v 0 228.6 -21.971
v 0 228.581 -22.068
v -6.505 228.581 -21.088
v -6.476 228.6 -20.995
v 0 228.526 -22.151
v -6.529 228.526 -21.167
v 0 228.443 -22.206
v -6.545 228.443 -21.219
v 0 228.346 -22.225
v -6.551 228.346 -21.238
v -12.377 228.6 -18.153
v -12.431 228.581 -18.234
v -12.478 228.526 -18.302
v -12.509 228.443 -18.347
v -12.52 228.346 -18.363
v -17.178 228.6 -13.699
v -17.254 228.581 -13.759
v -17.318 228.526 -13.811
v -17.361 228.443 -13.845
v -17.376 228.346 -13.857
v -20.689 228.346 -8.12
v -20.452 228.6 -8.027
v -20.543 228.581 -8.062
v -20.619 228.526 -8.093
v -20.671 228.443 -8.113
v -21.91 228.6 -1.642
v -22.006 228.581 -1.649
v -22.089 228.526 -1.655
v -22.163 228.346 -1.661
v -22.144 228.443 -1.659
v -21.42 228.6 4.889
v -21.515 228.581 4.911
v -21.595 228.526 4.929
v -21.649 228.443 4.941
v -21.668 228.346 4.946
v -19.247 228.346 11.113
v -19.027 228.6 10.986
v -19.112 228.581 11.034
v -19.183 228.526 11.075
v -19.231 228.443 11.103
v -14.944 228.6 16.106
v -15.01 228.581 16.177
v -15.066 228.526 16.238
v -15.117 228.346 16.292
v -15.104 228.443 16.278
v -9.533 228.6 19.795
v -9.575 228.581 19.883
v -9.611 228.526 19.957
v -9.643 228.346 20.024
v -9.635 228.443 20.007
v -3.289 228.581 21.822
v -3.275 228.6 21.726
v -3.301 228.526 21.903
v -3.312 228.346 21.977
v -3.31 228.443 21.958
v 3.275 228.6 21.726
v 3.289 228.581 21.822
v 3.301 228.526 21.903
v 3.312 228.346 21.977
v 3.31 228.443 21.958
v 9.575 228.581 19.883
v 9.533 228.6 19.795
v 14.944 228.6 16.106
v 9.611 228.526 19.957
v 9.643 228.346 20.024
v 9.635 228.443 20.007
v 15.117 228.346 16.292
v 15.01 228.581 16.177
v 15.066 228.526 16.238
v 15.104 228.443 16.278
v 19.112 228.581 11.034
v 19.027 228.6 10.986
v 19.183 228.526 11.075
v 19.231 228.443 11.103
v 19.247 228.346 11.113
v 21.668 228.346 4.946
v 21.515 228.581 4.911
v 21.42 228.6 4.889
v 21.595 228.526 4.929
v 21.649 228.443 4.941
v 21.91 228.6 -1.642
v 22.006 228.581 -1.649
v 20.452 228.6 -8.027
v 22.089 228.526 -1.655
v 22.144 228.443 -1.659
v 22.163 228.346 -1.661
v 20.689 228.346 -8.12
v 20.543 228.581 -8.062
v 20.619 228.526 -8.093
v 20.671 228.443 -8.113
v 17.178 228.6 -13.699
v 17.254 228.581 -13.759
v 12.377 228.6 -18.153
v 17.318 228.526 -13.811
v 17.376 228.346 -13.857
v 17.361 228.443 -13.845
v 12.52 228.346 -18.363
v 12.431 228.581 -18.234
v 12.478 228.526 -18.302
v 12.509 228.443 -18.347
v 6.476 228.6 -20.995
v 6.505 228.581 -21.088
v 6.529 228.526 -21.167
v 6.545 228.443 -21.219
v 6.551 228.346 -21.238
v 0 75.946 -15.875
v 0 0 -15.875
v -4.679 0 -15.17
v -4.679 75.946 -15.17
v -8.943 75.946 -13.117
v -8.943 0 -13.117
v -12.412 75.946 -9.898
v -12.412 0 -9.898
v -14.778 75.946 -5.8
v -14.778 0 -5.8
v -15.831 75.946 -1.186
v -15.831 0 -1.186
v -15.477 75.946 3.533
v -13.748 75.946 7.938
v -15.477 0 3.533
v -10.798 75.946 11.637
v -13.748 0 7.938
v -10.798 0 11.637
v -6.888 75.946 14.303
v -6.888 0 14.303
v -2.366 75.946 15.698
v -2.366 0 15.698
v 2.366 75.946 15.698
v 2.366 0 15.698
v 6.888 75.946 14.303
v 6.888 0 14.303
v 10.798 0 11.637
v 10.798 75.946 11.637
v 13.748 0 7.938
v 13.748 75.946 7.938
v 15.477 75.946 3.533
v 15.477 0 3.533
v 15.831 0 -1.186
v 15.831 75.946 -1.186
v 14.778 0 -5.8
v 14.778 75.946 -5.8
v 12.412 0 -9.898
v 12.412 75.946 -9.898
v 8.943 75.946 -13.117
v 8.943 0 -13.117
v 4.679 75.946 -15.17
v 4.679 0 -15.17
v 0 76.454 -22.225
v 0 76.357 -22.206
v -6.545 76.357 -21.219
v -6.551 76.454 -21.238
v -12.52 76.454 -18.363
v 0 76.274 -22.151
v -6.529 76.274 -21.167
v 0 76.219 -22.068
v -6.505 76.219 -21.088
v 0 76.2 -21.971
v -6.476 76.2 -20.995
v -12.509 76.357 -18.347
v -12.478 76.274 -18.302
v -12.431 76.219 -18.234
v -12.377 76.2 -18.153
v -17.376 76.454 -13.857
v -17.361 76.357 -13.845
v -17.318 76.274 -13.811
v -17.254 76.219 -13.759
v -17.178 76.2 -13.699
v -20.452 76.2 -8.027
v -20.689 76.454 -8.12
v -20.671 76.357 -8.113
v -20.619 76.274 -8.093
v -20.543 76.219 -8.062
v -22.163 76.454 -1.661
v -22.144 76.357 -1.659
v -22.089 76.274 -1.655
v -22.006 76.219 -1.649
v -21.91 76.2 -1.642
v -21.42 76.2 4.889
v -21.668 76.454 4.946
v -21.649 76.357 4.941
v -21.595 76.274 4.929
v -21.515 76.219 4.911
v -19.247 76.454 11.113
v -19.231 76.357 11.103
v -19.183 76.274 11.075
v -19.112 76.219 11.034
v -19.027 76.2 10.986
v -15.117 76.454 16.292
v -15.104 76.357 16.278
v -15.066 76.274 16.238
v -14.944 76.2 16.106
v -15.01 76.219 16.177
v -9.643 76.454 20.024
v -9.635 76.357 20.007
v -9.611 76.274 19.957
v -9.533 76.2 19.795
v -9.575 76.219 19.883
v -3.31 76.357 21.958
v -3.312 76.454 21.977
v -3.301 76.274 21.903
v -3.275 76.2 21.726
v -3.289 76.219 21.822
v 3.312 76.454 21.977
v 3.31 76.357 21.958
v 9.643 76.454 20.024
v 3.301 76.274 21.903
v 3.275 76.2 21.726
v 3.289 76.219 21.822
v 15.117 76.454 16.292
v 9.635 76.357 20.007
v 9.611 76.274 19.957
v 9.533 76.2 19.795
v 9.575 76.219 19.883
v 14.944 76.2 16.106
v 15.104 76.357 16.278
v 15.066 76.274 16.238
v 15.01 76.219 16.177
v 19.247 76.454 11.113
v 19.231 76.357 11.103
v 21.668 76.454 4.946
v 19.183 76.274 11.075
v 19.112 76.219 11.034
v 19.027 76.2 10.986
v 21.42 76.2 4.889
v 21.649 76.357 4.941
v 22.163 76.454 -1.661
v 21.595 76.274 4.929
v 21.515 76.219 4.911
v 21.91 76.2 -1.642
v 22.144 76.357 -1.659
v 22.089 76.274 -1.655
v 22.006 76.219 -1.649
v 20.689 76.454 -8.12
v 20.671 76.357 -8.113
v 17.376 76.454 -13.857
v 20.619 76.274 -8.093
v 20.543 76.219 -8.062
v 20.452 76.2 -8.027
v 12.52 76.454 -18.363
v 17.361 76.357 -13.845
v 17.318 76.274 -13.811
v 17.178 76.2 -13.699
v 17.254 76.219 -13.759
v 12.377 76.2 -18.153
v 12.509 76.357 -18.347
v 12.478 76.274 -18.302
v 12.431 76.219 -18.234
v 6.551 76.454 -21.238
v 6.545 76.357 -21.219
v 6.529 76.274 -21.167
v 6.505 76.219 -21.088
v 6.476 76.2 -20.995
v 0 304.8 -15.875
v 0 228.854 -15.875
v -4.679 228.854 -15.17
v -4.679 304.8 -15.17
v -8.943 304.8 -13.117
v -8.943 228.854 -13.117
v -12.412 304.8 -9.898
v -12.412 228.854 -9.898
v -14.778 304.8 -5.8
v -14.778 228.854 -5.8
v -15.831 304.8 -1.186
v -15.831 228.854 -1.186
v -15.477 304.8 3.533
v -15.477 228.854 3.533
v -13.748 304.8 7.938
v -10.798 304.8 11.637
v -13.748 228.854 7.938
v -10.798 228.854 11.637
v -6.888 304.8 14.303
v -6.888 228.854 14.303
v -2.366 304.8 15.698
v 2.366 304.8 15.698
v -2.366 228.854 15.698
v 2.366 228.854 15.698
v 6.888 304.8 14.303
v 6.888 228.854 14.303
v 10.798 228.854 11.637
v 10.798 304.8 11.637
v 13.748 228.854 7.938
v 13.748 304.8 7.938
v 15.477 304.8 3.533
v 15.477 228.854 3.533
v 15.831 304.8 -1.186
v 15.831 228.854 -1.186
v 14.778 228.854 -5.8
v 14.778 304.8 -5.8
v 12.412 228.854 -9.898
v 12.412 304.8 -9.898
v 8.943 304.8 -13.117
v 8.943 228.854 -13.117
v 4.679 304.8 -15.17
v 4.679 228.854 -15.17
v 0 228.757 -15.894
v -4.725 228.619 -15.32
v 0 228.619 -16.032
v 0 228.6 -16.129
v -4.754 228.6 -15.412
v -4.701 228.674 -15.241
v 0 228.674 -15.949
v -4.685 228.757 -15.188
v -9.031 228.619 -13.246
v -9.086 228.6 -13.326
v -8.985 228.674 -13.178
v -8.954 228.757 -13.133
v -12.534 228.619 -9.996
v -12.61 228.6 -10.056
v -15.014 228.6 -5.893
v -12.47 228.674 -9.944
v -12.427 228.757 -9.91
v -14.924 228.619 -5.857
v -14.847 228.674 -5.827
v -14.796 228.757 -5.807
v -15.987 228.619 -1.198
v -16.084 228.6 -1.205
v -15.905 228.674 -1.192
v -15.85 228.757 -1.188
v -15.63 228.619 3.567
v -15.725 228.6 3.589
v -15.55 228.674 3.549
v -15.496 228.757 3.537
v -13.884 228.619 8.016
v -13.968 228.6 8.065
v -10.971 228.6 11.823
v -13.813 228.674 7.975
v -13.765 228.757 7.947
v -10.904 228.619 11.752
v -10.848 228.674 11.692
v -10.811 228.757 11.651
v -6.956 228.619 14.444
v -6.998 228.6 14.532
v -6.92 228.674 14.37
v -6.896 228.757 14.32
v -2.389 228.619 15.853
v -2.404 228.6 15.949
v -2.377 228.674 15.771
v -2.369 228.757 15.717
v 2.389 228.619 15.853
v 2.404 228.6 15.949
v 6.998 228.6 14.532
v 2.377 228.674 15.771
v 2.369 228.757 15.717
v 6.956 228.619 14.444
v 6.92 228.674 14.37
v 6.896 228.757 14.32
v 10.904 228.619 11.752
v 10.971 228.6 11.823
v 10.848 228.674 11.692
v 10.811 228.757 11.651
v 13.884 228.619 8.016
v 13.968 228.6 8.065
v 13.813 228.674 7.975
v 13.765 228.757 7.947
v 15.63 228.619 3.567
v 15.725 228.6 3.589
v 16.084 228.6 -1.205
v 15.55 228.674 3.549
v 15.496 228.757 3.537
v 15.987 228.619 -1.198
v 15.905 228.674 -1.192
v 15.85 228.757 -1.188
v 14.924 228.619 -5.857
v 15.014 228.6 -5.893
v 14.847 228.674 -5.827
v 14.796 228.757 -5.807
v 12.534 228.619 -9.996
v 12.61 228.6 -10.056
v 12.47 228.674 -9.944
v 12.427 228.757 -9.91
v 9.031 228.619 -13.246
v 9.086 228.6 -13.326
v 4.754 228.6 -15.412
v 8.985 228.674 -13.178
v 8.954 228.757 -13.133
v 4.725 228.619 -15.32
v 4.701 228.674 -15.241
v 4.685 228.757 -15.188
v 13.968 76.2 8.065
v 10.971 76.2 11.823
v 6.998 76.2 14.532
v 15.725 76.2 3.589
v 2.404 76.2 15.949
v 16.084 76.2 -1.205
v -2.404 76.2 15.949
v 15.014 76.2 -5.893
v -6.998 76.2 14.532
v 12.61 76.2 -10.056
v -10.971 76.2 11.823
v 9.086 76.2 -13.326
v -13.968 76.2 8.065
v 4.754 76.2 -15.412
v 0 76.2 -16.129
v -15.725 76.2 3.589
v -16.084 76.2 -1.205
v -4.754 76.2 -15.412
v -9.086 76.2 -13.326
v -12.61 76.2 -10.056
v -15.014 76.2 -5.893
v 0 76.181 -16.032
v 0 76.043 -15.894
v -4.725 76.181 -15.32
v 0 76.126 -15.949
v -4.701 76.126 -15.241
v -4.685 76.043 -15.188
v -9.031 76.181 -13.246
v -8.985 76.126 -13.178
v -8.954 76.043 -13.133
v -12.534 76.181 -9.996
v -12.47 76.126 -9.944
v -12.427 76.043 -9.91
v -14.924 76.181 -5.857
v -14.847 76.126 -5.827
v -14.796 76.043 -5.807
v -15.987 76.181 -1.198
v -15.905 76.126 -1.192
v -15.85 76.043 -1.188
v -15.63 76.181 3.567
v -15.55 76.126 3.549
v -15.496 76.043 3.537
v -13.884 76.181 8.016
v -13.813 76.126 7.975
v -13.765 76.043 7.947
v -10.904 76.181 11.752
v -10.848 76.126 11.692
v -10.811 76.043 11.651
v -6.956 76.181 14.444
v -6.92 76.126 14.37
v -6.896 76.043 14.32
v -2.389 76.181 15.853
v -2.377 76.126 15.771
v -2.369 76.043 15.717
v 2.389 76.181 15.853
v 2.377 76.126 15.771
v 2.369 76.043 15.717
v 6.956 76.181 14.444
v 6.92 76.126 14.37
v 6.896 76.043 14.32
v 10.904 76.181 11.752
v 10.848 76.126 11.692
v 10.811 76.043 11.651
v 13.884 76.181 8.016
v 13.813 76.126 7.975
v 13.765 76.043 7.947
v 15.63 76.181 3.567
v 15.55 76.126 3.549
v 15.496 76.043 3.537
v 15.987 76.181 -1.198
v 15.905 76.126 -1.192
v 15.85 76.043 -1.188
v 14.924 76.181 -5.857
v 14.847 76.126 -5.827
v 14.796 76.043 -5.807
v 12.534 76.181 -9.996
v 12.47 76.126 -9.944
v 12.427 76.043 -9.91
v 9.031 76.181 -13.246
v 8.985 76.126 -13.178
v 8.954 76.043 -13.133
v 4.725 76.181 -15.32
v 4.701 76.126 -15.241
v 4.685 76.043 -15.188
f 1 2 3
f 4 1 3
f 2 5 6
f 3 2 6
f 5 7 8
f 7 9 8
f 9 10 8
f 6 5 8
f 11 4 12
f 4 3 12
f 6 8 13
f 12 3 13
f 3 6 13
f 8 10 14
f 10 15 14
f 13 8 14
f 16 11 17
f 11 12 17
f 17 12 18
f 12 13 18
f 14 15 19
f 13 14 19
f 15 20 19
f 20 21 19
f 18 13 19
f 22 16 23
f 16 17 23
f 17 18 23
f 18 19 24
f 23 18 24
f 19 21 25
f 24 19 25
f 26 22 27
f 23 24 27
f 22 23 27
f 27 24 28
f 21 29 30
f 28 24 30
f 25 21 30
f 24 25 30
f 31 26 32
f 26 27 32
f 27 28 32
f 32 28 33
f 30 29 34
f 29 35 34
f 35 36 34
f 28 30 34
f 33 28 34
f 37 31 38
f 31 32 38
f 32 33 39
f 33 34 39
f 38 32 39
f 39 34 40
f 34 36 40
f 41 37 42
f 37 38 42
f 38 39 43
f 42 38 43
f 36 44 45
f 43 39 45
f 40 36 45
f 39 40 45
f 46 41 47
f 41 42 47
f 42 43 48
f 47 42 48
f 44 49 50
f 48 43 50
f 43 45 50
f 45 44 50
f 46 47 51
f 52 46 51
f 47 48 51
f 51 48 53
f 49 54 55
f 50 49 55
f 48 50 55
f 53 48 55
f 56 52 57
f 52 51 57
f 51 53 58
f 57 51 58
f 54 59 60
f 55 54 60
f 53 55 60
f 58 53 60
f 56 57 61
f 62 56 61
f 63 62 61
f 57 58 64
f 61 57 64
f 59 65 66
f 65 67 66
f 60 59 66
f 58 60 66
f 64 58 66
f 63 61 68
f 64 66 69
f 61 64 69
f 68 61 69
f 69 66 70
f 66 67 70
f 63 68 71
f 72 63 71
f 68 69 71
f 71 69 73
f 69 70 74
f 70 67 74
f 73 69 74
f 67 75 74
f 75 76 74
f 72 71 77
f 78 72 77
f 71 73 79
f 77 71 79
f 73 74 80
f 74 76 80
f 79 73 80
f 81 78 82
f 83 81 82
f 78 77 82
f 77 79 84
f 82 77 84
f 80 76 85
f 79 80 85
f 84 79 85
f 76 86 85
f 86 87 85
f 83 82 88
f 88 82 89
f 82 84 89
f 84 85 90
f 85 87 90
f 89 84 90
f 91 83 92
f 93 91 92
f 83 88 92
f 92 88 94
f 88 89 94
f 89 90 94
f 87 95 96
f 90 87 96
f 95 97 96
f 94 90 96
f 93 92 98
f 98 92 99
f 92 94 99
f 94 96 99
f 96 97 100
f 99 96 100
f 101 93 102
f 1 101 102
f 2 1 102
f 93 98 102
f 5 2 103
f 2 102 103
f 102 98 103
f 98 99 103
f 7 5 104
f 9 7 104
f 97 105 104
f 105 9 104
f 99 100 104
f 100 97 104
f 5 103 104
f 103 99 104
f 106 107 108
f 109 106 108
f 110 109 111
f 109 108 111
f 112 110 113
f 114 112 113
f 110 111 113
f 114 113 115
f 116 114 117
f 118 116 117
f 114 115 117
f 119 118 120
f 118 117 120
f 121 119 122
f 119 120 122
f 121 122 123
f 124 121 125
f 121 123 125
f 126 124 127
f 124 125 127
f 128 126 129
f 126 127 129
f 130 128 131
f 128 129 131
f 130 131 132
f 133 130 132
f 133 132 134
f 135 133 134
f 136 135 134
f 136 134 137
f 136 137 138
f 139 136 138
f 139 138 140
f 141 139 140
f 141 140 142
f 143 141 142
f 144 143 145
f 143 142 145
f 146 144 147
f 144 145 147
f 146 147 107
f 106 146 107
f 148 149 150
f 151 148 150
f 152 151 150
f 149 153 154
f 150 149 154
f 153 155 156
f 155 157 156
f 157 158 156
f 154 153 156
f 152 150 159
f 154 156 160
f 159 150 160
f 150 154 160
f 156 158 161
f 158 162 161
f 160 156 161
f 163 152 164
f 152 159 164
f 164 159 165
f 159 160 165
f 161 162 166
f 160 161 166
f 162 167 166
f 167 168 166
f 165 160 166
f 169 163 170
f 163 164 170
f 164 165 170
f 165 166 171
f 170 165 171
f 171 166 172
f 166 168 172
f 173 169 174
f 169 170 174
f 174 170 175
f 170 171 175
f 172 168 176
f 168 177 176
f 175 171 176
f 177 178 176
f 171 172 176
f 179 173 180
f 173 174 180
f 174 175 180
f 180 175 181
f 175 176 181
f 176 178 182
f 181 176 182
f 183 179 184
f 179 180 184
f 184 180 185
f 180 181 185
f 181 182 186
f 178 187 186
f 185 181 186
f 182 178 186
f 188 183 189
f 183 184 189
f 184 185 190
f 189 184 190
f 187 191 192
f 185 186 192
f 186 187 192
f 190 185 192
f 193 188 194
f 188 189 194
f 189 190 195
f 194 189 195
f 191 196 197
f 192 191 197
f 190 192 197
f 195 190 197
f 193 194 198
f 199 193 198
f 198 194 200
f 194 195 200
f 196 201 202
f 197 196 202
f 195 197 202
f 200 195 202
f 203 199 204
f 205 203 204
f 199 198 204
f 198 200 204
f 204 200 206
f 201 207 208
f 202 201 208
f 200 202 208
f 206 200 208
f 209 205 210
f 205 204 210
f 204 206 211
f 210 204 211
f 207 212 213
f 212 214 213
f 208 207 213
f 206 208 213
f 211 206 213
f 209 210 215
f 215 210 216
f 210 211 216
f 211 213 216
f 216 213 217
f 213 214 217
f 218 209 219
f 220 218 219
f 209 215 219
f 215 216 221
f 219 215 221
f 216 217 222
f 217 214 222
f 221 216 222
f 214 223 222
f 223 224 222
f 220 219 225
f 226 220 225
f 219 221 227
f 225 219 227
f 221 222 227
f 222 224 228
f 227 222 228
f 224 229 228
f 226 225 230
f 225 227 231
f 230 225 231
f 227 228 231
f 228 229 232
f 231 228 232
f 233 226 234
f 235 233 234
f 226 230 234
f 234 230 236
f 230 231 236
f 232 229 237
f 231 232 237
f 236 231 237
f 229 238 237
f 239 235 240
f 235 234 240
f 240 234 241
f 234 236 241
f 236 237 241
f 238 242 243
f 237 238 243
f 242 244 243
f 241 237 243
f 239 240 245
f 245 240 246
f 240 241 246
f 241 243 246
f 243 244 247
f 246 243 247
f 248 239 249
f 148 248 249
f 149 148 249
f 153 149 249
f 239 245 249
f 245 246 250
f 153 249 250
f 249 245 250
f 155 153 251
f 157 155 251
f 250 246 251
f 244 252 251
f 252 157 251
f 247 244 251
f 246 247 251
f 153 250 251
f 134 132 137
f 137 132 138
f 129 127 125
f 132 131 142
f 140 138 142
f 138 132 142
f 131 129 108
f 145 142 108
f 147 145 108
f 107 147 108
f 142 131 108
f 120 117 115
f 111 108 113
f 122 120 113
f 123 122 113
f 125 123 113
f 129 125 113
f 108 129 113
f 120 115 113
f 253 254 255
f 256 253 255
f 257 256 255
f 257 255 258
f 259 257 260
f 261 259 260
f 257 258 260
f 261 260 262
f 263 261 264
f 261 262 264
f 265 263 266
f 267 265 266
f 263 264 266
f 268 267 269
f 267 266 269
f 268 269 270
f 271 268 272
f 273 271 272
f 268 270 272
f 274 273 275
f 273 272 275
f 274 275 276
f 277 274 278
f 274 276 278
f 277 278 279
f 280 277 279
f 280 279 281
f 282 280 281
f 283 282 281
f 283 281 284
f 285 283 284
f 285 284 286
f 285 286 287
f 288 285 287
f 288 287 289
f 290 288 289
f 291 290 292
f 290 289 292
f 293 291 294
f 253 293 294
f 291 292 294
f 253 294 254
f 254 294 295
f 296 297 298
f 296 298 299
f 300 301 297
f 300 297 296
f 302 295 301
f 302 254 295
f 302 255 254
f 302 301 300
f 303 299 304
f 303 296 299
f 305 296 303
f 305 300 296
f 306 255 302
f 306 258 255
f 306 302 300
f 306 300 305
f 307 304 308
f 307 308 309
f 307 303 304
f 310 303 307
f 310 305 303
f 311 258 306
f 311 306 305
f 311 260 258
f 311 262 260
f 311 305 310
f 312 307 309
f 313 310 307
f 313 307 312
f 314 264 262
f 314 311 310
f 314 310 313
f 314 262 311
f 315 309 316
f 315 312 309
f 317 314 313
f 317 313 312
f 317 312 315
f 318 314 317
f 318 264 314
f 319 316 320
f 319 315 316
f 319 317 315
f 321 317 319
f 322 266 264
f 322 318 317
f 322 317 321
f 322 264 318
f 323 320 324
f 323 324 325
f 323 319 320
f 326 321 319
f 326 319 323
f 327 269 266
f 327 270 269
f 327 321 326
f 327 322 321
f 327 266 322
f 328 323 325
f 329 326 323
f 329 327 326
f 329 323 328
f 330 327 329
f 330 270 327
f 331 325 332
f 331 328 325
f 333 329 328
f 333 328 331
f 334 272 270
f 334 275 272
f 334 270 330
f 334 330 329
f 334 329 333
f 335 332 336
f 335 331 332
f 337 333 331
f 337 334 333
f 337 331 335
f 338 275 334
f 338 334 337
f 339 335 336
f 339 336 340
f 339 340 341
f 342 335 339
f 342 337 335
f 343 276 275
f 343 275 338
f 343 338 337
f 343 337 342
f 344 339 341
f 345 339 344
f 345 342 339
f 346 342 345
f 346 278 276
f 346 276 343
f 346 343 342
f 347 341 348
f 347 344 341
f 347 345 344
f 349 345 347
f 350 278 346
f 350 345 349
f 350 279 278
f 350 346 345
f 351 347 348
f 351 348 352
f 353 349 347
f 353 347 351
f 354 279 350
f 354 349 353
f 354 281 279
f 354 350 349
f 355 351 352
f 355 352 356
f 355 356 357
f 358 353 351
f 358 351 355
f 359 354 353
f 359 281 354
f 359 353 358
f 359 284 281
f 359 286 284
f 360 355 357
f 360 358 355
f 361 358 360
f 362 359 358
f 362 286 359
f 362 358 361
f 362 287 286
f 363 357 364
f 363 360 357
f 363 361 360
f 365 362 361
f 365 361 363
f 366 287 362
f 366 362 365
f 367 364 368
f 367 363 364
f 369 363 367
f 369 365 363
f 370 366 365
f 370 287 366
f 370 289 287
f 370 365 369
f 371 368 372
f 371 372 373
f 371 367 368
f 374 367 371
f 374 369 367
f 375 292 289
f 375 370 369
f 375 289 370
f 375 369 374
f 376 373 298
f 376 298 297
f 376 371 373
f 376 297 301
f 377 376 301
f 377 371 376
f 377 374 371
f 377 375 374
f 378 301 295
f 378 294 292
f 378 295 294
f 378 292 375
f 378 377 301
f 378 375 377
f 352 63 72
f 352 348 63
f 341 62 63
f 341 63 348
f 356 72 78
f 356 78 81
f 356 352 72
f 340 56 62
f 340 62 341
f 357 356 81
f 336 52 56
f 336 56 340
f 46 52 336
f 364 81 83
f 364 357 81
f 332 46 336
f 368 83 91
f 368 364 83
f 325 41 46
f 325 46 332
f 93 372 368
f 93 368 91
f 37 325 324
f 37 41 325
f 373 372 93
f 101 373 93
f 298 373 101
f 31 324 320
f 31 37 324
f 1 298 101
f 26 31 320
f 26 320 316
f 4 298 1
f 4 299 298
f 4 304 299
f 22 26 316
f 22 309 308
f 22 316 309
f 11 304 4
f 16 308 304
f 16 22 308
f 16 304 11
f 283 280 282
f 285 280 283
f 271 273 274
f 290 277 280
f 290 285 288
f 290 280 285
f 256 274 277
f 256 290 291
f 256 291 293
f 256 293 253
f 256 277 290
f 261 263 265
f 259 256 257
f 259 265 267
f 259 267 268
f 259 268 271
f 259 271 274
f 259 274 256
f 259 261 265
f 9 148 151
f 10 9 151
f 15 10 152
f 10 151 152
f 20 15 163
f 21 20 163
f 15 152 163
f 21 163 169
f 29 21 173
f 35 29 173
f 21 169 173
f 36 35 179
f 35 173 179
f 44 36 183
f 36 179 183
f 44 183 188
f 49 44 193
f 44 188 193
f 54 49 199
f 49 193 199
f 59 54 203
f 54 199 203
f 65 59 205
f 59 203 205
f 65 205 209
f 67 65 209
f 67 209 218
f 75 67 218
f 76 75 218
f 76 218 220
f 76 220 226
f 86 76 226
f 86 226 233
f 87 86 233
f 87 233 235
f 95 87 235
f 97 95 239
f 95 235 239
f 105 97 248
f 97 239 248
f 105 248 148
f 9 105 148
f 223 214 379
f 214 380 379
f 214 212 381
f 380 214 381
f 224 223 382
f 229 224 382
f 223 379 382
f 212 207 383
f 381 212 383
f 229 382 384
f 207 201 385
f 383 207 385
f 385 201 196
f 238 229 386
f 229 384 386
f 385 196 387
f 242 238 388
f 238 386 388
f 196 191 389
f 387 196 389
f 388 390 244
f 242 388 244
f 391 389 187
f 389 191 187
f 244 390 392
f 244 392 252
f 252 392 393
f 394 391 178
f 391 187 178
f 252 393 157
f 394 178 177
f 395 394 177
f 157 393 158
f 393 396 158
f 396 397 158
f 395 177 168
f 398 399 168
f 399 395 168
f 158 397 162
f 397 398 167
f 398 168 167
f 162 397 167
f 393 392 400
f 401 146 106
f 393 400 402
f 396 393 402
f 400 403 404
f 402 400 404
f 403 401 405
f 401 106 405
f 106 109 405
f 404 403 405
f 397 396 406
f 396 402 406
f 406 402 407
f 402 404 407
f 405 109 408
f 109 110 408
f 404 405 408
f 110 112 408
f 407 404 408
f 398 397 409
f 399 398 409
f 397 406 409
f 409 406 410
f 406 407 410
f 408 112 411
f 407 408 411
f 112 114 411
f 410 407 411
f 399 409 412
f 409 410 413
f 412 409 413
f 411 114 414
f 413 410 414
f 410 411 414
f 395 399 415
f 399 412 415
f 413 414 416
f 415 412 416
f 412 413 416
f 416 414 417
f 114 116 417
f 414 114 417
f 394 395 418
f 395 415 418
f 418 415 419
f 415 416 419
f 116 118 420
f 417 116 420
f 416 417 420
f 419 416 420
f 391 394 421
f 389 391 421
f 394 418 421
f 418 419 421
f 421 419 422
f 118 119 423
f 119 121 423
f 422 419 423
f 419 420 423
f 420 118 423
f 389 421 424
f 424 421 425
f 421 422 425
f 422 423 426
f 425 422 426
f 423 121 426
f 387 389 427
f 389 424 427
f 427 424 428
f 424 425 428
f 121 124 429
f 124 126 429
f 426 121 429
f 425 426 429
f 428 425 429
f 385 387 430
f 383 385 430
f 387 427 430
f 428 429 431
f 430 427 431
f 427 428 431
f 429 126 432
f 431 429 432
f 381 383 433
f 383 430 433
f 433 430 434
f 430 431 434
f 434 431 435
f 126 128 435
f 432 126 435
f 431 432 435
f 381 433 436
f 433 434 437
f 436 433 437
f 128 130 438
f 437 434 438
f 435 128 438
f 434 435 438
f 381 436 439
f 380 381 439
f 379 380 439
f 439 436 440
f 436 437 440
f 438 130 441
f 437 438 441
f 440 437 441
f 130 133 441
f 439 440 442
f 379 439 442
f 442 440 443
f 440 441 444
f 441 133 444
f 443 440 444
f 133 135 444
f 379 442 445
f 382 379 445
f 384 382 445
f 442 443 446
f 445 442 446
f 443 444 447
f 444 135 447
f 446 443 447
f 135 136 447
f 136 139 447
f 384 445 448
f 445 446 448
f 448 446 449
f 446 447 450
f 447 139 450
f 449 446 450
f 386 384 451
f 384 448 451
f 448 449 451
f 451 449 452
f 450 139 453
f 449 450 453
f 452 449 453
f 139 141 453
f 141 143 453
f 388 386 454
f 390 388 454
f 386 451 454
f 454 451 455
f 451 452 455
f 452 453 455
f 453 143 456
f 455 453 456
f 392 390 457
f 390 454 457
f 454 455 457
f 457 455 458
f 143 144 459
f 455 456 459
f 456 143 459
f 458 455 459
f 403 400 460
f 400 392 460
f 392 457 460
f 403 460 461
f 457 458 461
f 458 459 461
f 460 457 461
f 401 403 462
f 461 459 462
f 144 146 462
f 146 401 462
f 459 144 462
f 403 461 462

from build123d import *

# Parameters (mm, degrees)
SKETCH1_R           = 15.875
BOSS_EXTRUDE1_DEPTH = 76.2
SKETCH2_R           = 22.225
BOSS_EXTRUDE2_DEPTH = 152.4
SKETCH3_R           = 15.875
BOSS_EXTRUDE3_DEPTH = 76.2
FILLET1_R           = 0.254
FILLET2_R           = 0.254
FILLET3_R           = 0.254
FILLET4_R           = 0.254


with BuildPart() as part:
    # Sketch1 → Boss-Extrude1 (new body)
    with BuildSketch(Plane(origin=(0, 0, 0), x_dir=(1, 0, 0), z_dir=(0, 1, 0))):
        with Locations(Location((0, 0, 0), (0, 0, 90))):
            Circle(SKETCH1_R)
    extrude(amount=BOSS_EXTRUDE1_DEPTH)

    # Sketch2 → Boss-Extrude2 (add)
    with BuildSketch(Plane(origin=(0, 76.2, 0), x_dir=(1, 0, 0), z_dir=(0, 1, 0))):
        with Locations(Location((0, 0, 0), (0, 0, 90))):
            Circle(SKETCH2_R)
    extrude(amount=BOSS_EXTRUDE2_DEPTH)

    # Sketch3 → Boss-Extrude3 (add)
    with BuildSketch(Plane(origin=(0, 228.6, 0), x_dir=(1, 0, 0), z_dir=(0, 1, 0))):
        with Locations(Location((0, 0, 0), (0, 0, 90))):
            Circle(SKETCH3_R)
    extrude(amount=BOSS_EXTRUDE3_DEPTH)

    # Fillet1
    fillet1_edges = [part.edges().sort_by_distance(p)[0] for p in [
        (0, 76.2, 15.875),
    ]]
    fillet(fillet1_edges, radius=FILLET1_R)

    # Fillet2
    fillet2_edges = [part.edges().sort_by_distance(p)[0] for p in [
        (0, 228.6, 15.875),
    ]]
    fillet(fillet2_edges, radius=FILLET2_R)

    # Fillet3
    fillet3_edges = [part.edges().sort_by_distance(p)[0] for p in [
        (0, 228.6, 22.225),
    ]]
    fillet(fillet3_edges, radius=FILLET3_R)

    # Fillet4
    fillet4_edges = [part.edges().sort_by_distance(p)[0] for p in [
        (0, 76.2, 22.225),
    ]]
    fillet(fillet4_edges, radius=FILLET4_R)


solid = part.part
